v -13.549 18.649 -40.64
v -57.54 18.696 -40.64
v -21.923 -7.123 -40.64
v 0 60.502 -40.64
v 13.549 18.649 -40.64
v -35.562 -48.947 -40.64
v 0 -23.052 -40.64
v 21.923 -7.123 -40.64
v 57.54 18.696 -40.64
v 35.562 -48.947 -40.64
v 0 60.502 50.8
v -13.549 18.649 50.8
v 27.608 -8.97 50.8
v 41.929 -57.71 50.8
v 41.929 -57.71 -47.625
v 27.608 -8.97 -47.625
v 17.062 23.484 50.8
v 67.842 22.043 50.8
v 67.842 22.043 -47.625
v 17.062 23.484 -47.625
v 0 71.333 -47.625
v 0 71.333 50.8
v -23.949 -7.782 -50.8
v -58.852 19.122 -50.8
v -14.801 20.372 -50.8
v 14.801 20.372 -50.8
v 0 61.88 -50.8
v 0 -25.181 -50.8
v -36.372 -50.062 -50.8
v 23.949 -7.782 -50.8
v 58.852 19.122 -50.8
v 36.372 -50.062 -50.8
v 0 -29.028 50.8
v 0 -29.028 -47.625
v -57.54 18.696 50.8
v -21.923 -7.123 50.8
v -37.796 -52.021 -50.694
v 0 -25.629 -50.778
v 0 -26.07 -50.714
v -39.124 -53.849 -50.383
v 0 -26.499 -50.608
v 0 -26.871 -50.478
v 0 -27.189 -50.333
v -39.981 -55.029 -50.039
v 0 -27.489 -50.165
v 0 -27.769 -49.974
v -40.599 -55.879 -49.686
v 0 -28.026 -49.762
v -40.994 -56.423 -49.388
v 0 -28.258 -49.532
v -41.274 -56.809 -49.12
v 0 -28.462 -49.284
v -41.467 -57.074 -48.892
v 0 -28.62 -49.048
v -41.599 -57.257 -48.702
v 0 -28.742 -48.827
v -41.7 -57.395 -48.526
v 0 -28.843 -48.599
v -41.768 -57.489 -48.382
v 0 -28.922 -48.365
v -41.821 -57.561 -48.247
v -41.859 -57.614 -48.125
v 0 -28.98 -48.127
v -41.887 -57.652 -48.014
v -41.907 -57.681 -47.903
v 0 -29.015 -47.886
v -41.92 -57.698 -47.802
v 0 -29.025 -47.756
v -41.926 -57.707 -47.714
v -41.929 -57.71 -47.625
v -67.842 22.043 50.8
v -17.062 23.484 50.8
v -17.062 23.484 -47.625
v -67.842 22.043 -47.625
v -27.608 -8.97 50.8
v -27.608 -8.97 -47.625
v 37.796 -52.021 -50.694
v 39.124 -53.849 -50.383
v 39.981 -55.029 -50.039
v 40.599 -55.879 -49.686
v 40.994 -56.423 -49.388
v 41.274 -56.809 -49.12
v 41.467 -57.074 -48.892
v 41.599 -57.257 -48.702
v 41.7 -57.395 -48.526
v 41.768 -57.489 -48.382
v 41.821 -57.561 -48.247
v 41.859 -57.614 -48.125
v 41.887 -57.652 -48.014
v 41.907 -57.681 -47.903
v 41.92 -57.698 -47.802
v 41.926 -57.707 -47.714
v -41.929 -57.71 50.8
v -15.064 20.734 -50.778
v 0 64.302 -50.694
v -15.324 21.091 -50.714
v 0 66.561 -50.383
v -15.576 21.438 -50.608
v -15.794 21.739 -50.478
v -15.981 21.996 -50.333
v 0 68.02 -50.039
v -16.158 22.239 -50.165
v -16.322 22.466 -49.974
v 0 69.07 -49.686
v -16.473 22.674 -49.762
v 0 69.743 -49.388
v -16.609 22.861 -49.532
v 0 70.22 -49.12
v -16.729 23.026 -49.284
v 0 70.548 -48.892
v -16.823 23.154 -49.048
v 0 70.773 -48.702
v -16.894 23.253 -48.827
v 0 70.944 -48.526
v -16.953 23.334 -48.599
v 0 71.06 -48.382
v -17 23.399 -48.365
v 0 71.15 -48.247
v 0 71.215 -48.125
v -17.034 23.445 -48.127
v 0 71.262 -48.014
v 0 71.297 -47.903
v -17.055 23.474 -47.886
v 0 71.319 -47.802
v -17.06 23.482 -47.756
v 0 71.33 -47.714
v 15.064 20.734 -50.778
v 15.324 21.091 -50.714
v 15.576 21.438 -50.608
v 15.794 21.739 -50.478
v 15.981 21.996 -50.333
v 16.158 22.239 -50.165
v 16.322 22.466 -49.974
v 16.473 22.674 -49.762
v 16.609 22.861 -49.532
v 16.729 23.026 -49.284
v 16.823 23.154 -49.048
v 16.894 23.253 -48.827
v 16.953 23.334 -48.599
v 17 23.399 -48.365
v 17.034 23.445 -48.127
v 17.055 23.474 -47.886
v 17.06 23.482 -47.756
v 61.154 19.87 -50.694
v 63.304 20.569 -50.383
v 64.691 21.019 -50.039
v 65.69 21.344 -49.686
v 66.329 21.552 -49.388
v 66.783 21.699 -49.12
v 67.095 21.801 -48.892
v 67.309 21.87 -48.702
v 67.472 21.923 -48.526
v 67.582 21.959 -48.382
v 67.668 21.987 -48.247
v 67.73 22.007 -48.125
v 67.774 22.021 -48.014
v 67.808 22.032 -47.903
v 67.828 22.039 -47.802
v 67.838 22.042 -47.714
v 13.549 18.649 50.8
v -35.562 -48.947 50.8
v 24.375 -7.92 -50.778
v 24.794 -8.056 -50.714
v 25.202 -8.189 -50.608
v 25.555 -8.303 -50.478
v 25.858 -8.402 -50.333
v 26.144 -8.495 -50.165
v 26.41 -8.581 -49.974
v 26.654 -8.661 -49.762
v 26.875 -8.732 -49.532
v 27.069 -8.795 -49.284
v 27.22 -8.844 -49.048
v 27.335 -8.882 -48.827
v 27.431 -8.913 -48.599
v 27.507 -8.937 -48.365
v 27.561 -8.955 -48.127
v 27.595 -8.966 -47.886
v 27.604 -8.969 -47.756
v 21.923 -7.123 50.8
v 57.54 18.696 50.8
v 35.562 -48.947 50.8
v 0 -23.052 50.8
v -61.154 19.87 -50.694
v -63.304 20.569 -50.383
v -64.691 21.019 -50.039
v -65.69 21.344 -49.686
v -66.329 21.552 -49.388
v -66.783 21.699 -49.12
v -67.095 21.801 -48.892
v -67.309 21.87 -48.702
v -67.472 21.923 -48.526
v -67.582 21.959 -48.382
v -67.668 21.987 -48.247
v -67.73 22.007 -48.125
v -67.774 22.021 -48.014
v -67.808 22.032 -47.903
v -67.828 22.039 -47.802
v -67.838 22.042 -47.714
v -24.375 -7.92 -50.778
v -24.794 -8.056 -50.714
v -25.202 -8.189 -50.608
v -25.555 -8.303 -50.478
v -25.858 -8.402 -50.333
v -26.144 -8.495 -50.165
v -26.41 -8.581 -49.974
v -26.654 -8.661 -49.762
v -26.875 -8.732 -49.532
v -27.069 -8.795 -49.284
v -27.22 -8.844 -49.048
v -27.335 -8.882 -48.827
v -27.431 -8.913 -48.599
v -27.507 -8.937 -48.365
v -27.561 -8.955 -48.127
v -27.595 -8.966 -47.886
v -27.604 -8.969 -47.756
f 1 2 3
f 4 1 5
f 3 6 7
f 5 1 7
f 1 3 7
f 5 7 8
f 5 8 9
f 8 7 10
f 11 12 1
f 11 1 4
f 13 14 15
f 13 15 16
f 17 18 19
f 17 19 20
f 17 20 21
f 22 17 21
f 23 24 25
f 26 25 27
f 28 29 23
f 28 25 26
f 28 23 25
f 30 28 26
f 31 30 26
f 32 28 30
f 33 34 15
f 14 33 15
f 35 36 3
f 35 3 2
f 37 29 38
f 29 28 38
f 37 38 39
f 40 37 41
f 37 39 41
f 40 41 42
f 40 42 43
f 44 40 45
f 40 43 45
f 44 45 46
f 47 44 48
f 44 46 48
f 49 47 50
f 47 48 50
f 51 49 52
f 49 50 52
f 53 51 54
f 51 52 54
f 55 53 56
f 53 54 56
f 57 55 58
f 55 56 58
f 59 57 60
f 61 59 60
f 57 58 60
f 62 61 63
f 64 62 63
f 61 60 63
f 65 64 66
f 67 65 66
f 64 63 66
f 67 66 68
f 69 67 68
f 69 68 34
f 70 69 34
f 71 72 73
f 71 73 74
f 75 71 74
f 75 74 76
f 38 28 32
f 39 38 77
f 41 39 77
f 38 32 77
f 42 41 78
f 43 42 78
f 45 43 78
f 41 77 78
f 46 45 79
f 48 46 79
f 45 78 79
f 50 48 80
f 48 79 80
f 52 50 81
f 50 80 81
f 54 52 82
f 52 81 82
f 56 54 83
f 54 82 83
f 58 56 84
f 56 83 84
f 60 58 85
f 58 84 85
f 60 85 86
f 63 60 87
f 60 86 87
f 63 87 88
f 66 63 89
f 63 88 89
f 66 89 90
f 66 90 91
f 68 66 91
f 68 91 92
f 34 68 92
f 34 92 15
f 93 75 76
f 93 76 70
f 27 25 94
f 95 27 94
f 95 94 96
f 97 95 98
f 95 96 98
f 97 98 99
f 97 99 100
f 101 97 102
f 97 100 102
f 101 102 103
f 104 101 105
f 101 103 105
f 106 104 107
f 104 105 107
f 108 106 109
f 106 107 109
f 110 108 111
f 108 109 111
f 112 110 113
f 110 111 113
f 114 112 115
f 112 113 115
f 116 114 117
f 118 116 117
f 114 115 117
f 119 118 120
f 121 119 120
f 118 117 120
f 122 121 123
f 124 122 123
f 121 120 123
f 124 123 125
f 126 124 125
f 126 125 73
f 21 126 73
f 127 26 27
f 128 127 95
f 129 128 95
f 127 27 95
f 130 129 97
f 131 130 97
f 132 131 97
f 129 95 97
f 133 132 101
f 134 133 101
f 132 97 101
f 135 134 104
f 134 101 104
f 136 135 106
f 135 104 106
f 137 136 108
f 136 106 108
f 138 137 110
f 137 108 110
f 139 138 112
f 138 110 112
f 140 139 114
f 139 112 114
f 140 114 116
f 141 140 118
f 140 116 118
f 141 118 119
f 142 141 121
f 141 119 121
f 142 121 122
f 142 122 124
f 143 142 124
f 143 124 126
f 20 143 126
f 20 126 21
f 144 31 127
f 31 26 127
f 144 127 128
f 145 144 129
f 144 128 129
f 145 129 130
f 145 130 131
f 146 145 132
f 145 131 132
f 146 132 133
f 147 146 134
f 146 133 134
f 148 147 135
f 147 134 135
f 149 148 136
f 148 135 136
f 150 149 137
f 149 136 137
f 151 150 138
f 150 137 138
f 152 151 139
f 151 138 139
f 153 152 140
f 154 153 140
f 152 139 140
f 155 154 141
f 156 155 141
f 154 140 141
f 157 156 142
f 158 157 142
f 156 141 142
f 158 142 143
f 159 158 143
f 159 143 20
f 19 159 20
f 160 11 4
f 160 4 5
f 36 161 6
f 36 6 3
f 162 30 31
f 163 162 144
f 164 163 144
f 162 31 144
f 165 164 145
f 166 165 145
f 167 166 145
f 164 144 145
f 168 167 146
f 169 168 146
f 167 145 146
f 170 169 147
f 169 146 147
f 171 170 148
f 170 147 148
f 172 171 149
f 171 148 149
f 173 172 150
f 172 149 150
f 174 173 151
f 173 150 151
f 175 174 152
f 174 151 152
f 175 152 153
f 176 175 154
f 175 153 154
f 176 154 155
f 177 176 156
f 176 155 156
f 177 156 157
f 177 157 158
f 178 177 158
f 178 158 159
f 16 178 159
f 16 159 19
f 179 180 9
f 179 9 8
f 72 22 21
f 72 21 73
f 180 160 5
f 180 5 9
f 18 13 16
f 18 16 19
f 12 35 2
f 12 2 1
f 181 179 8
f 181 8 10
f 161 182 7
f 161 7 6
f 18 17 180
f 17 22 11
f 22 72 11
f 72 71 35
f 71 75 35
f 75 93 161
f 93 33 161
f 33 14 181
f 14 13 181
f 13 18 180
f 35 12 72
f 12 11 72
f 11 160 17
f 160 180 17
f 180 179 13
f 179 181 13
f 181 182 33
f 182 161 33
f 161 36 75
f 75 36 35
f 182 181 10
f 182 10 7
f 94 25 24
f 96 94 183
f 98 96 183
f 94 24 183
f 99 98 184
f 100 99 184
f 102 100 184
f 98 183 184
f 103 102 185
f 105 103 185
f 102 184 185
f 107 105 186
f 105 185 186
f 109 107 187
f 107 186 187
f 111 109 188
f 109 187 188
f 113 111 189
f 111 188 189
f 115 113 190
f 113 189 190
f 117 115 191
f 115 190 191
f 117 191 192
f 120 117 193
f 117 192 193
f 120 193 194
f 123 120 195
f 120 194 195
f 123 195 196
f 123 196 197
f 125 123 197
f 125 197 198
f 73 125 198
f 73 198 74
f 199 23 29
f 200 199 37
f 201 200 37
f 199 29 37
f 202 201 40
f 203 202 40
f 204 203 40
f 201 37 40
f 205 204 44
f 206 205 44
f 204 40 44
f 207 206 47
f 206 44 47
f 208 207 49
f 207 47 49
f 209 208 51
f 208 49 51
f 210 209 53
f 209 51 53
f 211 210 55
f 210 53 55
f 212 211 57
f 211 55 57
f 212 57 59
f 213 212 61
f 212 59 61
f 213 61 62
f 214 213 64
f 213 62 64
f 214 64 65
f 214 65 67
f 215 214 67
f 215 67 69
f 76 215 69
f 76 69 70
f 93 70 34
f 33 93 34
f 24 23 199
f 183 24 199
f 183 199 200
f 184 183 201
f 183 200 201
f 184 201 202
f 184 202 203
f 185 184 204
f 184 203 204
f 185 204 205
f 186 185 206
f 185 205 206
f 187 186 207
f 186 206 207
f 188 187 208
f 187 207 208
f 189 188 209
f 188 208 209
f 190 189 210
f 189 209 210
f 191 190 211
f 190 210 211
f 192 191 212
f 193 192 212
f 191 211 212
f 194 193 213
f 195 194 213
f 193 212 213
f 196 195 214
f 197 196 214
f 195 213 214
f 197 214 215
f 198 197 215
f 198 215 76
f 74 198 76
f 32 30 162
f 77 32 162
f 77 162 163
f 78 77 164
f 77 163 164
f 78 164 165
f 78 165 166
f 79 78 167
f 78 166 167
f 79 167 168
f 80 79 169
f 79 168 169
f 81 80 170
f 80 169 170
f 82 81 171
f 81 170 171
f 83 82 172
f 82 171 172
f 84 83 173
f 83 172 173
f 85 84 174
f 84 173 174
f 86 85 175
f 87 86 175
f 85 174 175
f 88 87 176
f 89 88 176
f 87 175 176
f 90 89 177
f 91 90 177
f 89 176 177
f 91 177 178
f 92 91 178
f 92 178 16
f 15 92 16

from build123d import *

# Parameters (mm, degrees)
F1_DEPTH = 50.8
F3_DEPTH = 10.16
F4_R     = 3.175


with BuildPart() as f1:
    # F0 (on Top) → F1 (new body, symmetric)
    with BuildSketch(Plane.XY):
        Polygon((13.549365, 18.649101), (0, 60.501583), (-13.549365, 18.649101), (-57.540424, 18.696017), (-21.923333, -7.123323), (-35.561938, -48.946809), (0, -23.051556), (35.561938, -48.946809), (21.923333, -7.123323), (57.540424, 18.696017), align=None)
        Polygon((67.841942, 22.043183), (17.062389, 23.484363), (0, 71.333239), (-17.062389, 23.484363), (-67.841942, 22.043183), (-27.607525, -8.970229), (-41.928626, -57.709802), (0, -29.028269), (41.928626, -57.709802), (27.607525, -8.970229), align=None)
        Polygon((-13.549365, 18.649101), (0, 60.501583), (13.549365, 18.649101), (57.540424, 18.696017), (21.923333, -7.123323), (35.561938, -48.946809), (0, -23.051556), (-35.561938, -48.946809), (-21.923333, -7.123323), (-57.540424, 18.696017), align=None, mode=Mode.SUBTRACT)
    extrude(amount=F1_DEPTH, both=True)

    # F2 (on face) → F3 (join)
    with BuildSketch(Plane(origin=(0, 0, -50.8), x_dir=(1, 0, 0), z_dir=(0, 0, -1))):
        Polygon((0, 23.051556), (-35.561938, 48.946809), (-21.923333, 7.123323), (-57.540424, -18.696017), (-13.549365, -18.649101), (0, -60.501583), (13.549365, -18.649101), (57.540424, -18.696017), (21.923333, 7.123323), (35.561938, 48.946809), align=None)
    extrude(amount=-F3_DEPTH)

    # F4
    f4_edges = [f1.edges().sort_by_distance(p)[0] for p in [
        (42.452165, 22.763773, -50.8),
        (8.531194, 47.408801, -50.8),
        (-8.531194, 47.408801, -50.8),
        (-42.452165, 22.763773, -50.8),
        (-47.724733, 6.536477, -50.8),
        (-34.768075, -33.340016, -50.8),
        (-20.964313, -43.369036, -50.8),
        (20.964313, -43.369036, -50.8),
        (34.768075, -33.340016, -50.8),
        (47.724733, 6.536477, -50.8),
    ]]
    fillet(f4_edges, radius=F4_R)


solid = f1.part
